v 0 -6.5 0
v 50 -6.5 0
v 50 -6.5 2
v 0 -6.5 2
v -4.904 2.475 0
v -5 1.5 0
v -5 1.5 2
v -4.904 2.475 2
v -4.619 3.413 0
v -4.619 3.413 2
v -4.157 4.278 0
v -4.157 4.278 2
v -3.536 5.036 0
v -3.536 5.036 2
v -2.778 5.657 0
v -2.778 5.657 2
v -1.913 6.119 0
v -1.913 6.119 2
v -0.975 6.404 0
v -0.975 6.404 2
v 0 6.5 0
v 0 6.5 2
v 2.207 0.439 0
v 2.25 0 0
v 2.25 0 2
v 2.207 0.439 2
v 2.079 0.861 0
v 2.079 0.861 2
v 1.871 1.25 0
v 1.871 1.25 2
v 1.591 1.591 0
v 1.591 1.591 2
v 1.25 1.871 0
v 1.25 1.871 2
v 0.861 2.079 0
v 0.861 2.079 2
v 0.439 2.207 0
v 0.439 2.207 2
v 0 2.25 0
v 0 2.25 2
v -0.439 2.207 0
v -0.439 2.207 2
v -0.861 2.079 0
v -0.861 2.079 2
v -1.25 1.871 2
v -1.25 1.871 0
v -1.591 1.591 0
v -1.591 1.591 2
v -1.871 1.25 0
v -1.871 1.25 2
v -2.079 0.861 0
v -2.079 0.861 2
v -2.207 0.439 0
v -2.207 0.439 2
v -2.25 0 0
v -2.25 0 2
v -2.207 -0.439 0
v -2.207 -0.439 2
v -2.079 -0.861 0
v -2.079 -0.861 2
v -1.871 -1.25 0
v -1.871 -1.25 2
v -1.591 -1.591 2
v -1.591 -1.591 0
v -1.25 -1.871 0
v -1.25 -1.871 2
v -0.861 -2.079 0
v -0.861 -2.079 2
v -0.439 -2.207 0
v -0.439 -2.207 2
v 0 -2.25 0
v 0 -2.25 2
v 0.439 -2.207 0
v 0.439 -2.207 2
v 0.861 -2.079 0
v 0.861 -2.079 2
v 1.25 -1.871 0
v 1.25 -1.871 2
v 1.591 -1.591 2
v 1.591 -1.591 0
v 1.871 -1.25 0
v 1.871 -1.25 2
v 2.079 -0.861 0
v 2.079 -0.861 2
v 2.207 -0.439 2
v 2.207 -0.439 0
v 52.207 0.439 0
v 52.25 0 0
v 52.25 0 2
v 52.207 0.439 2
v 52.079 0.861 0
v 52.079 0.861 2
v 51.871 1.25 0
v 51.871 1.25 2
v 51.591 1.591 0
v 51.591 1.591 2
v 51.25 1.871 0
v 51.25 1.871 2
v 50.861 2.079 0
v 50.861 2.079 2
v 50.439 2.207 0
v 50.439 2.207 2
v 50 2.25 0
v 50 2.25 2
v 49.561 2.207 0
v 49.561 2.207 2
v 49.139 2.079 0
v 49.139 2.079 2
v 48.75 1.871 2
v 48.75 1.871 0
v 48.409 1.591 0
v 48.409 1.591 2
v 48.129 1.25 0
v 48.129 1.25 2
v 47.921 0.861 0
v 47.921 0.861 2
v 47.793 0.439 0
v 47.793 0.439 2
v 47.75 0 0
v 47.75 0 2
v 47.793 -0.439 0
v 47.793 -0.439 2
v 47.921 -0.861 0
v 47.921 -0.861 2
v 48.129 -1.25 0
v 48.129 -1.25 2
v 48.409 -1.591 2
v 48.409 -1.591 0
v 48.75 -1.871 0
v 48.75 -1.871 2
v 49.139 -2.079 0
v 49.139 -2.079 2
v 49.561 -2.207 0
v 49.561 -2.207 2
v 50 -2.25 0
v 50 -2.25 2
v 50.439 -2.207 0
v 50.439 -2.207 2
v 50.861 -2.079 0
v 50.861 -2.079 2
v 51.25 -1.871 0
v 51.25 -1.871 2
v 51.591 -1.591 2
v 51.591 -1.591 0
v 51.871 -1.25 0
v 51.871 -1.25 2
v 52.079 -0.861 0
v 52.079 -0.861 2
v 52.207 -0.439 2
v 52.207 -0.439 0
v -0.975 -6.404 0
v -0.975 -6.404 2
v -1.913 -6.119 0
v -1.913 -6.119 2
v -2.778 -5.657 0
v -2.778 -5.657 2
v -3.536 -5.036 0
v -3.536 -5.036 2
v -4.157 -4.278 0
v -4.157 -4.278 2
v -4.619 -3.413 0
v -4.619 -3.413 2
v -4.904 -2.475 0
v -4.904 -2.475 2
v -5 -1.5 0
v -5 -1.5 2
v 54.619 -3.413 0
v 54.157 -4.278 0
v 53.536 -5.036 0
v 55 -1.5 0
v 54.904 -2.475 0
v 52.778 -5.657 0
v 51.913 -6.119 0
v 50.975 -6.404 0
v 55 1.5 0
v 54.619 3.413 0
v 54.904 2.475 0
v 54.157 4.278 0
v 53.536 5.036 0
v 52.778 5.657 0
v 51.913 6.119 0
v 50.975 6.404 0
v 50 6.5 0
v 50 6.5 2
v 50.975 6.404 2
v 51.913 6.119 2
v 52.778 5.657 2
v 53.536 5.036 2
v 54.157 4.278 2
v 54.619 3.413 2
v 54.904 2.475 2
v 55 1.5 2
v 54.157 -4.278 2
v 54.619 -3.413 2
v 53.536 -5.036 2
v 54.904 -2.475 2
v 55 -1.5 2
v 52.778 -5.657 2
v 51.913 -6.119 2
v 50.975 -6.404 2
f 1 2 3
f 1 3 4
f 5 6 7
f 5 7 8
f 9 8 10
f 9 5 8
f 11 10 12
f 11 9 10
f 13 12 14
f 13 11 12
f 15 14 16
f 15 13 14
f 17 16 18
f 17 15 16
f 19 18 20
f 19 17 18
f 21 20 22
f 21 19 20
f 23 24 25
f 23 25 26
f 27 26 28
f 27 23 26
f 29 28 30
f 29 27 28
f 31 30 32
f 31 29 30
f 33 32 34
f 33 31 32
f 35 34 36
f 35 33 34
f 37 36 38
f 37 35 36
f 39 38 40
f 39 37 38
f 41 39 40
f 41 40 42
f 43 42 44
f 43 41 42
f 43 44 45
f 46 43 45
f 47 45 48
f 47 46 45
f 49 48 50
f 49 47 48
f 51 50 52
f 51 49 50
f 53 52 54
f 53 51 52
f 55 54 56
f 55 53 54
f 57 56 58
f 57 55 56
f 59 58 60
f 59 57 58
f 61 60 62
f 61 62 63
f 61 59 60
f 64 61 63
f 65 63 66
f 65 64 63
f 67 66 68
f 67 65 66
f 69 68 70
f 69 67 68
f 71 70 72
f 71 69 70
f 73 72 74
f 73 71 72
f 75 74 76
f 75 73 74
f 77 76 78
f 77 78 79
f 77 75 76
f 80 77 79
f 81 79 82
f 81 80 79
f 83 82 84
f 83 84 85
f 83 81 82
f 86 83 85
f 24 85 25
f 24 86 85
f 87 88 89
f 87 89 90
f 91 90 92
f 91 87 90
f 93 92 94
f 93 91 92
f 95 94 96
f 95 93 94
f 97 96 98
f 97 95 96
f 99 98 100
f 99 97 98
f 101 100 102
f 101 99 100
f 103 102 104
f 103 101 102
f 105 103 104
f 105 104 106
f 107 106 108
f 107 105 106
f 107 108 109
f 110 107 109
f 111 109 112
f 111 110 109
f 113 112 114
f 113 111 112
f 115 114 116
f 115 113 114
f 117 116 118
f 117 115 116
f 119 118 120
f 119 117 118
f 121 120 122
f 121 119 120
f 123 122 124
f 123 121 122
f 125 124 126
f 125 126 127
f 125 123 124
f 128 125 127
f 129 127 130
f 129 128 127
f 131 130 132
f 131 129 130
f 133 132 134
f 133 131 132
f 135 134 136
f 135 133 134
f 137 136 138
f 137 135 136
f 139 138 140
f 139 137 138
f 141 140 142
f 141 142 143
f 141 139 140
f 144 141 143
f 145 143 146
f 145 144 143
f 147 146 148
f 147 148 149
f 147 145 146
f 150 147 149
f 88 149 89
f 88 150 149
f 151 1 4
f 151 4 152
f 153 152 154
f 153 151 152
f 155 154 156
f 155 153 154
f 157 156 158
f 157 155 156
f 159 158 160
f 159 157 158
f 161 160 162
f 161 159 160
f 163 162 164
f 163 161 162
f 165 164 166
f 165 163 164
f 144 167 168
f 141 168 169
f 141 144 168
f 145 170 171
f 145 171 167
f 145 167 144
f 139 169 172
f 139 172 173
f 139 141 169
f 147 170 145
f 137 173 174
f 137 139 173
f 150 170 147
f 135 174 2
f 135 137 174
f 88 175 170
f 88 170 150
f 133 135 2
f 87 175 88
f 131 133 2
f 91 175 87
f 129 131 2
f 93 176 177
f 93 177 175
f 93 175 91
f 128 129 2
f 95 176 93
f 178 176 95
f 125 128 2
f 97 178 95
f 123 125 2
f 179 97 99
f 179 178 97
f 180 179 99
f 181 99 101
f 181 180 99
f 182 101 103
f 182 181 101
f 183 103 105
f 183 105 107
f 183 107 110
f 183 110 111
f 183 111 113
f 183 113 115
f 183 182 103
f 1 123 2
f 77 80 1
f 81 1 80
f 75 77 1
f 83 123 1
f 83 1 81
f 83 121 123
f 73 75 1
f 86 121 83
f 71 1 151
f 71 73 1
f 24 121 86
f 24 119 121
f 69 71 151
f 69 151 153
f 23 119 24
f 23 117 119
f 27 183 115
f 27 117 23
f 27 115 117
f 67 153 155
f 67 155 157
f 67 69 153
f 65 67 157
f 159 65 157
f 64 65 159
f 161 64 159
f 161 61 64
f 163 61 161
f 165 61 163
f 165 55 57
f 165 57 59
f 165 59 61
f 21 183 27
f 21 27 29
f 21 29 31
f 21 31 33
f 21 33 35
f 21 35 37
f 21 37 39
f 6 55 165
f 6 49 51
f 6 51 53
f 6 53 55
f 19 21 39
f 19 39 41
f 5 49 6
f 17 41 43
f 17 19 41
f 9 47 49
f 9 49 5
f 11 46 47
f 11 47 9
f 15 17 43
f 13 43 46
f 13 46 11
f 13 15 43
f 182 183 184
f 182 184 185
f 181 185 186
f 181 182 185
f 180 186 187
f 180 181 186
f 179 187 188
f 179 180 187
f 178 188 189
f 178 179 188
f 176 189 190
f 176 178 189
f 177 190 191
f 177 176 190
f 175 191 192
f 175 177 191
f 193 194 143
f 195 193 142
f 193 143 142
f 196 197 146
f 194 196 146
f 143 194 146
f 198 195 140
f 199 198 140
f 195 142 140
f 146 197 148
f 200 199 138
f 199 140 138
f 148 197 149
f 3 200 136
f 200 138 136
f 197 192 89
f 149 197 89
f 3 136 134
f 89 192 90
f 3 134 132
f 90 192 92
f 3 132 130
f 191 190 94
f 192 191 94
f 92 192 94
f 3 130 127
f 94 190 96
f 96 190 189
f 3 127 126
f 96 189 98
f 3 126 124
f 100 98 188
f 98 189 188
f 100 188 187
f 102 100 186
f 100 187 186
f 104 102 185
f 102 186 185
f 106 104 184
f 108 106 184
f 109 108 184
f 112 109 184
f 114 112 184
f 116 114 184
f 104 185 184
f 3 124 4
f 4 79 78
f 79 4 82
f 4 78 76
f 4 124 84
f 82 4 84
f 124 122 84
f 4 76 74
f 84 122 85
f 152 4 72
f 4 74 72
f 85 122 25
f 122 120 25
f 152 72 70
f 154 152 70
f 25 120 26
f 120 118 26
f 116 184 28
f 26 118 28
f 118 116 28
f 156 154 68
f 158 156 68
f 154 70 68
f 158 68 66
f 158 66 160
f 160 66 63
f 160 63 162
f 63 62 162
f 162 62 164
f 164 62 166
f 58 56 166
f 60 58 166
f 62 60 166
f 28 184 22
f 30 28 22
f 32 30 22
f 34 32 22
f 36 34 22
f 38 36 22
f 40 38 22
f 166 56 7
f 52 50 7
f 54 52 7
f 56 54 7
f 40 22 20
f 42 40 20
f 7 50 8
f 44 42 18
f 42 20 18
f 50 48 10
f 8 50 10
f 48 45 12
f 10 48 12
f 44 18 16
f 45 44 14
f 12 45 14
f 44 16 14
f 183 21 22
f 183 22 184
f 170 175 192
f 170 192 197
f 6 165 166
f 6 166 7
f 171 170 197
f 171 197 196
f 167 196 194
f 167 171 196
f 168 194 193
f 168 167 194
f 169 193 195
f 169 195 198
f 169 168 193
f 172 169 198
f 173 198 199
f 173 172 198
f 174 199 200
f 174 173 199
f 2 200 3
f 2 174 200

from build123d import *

# Parameters (mm, degrees)
ESQUISSE1_R        = 2.25
BOSS_EXTRU_1_DEPTH = 2


with BuildPart() as part:
    # Esquisse1 → Boss.-Extru.1 (new body)
    with BuildSketch(Plane.XY):
        with BuildLine():
            Line((0, 6.5), (50, 6.5))
            ThreePointArc((50, 6.5), (53.535533906, 5.035533906), (55, 1.5))
            Line((55, 1.5), (55, -1.5))
            ThreePointArc((55, -1.5), (53.535533906, -5.035533906), (50, -6.5))
            Line((50, -6.5), (0, -6.5))
            ThreePointArc((0, -6.5), (-3.535533906, -5.035533906), (-5, -1.5))
            Line((-5, -1.5), (-5, 1.5))
            ThreePointArc((-5, 1.5), (-3.535533906, 5.035533906), (0, 6.5))
        make_face()
        Circle(ESQUISSE1_R, mode=Mode.SUBTRACT)
        with Locations((50, 0)):
            Circle(ESQUISSE1_R, mode=Mode.SUBTRACT)
    extrude(amount=BOSS_EXTRU_1_DEPTH)


solid = part.part
